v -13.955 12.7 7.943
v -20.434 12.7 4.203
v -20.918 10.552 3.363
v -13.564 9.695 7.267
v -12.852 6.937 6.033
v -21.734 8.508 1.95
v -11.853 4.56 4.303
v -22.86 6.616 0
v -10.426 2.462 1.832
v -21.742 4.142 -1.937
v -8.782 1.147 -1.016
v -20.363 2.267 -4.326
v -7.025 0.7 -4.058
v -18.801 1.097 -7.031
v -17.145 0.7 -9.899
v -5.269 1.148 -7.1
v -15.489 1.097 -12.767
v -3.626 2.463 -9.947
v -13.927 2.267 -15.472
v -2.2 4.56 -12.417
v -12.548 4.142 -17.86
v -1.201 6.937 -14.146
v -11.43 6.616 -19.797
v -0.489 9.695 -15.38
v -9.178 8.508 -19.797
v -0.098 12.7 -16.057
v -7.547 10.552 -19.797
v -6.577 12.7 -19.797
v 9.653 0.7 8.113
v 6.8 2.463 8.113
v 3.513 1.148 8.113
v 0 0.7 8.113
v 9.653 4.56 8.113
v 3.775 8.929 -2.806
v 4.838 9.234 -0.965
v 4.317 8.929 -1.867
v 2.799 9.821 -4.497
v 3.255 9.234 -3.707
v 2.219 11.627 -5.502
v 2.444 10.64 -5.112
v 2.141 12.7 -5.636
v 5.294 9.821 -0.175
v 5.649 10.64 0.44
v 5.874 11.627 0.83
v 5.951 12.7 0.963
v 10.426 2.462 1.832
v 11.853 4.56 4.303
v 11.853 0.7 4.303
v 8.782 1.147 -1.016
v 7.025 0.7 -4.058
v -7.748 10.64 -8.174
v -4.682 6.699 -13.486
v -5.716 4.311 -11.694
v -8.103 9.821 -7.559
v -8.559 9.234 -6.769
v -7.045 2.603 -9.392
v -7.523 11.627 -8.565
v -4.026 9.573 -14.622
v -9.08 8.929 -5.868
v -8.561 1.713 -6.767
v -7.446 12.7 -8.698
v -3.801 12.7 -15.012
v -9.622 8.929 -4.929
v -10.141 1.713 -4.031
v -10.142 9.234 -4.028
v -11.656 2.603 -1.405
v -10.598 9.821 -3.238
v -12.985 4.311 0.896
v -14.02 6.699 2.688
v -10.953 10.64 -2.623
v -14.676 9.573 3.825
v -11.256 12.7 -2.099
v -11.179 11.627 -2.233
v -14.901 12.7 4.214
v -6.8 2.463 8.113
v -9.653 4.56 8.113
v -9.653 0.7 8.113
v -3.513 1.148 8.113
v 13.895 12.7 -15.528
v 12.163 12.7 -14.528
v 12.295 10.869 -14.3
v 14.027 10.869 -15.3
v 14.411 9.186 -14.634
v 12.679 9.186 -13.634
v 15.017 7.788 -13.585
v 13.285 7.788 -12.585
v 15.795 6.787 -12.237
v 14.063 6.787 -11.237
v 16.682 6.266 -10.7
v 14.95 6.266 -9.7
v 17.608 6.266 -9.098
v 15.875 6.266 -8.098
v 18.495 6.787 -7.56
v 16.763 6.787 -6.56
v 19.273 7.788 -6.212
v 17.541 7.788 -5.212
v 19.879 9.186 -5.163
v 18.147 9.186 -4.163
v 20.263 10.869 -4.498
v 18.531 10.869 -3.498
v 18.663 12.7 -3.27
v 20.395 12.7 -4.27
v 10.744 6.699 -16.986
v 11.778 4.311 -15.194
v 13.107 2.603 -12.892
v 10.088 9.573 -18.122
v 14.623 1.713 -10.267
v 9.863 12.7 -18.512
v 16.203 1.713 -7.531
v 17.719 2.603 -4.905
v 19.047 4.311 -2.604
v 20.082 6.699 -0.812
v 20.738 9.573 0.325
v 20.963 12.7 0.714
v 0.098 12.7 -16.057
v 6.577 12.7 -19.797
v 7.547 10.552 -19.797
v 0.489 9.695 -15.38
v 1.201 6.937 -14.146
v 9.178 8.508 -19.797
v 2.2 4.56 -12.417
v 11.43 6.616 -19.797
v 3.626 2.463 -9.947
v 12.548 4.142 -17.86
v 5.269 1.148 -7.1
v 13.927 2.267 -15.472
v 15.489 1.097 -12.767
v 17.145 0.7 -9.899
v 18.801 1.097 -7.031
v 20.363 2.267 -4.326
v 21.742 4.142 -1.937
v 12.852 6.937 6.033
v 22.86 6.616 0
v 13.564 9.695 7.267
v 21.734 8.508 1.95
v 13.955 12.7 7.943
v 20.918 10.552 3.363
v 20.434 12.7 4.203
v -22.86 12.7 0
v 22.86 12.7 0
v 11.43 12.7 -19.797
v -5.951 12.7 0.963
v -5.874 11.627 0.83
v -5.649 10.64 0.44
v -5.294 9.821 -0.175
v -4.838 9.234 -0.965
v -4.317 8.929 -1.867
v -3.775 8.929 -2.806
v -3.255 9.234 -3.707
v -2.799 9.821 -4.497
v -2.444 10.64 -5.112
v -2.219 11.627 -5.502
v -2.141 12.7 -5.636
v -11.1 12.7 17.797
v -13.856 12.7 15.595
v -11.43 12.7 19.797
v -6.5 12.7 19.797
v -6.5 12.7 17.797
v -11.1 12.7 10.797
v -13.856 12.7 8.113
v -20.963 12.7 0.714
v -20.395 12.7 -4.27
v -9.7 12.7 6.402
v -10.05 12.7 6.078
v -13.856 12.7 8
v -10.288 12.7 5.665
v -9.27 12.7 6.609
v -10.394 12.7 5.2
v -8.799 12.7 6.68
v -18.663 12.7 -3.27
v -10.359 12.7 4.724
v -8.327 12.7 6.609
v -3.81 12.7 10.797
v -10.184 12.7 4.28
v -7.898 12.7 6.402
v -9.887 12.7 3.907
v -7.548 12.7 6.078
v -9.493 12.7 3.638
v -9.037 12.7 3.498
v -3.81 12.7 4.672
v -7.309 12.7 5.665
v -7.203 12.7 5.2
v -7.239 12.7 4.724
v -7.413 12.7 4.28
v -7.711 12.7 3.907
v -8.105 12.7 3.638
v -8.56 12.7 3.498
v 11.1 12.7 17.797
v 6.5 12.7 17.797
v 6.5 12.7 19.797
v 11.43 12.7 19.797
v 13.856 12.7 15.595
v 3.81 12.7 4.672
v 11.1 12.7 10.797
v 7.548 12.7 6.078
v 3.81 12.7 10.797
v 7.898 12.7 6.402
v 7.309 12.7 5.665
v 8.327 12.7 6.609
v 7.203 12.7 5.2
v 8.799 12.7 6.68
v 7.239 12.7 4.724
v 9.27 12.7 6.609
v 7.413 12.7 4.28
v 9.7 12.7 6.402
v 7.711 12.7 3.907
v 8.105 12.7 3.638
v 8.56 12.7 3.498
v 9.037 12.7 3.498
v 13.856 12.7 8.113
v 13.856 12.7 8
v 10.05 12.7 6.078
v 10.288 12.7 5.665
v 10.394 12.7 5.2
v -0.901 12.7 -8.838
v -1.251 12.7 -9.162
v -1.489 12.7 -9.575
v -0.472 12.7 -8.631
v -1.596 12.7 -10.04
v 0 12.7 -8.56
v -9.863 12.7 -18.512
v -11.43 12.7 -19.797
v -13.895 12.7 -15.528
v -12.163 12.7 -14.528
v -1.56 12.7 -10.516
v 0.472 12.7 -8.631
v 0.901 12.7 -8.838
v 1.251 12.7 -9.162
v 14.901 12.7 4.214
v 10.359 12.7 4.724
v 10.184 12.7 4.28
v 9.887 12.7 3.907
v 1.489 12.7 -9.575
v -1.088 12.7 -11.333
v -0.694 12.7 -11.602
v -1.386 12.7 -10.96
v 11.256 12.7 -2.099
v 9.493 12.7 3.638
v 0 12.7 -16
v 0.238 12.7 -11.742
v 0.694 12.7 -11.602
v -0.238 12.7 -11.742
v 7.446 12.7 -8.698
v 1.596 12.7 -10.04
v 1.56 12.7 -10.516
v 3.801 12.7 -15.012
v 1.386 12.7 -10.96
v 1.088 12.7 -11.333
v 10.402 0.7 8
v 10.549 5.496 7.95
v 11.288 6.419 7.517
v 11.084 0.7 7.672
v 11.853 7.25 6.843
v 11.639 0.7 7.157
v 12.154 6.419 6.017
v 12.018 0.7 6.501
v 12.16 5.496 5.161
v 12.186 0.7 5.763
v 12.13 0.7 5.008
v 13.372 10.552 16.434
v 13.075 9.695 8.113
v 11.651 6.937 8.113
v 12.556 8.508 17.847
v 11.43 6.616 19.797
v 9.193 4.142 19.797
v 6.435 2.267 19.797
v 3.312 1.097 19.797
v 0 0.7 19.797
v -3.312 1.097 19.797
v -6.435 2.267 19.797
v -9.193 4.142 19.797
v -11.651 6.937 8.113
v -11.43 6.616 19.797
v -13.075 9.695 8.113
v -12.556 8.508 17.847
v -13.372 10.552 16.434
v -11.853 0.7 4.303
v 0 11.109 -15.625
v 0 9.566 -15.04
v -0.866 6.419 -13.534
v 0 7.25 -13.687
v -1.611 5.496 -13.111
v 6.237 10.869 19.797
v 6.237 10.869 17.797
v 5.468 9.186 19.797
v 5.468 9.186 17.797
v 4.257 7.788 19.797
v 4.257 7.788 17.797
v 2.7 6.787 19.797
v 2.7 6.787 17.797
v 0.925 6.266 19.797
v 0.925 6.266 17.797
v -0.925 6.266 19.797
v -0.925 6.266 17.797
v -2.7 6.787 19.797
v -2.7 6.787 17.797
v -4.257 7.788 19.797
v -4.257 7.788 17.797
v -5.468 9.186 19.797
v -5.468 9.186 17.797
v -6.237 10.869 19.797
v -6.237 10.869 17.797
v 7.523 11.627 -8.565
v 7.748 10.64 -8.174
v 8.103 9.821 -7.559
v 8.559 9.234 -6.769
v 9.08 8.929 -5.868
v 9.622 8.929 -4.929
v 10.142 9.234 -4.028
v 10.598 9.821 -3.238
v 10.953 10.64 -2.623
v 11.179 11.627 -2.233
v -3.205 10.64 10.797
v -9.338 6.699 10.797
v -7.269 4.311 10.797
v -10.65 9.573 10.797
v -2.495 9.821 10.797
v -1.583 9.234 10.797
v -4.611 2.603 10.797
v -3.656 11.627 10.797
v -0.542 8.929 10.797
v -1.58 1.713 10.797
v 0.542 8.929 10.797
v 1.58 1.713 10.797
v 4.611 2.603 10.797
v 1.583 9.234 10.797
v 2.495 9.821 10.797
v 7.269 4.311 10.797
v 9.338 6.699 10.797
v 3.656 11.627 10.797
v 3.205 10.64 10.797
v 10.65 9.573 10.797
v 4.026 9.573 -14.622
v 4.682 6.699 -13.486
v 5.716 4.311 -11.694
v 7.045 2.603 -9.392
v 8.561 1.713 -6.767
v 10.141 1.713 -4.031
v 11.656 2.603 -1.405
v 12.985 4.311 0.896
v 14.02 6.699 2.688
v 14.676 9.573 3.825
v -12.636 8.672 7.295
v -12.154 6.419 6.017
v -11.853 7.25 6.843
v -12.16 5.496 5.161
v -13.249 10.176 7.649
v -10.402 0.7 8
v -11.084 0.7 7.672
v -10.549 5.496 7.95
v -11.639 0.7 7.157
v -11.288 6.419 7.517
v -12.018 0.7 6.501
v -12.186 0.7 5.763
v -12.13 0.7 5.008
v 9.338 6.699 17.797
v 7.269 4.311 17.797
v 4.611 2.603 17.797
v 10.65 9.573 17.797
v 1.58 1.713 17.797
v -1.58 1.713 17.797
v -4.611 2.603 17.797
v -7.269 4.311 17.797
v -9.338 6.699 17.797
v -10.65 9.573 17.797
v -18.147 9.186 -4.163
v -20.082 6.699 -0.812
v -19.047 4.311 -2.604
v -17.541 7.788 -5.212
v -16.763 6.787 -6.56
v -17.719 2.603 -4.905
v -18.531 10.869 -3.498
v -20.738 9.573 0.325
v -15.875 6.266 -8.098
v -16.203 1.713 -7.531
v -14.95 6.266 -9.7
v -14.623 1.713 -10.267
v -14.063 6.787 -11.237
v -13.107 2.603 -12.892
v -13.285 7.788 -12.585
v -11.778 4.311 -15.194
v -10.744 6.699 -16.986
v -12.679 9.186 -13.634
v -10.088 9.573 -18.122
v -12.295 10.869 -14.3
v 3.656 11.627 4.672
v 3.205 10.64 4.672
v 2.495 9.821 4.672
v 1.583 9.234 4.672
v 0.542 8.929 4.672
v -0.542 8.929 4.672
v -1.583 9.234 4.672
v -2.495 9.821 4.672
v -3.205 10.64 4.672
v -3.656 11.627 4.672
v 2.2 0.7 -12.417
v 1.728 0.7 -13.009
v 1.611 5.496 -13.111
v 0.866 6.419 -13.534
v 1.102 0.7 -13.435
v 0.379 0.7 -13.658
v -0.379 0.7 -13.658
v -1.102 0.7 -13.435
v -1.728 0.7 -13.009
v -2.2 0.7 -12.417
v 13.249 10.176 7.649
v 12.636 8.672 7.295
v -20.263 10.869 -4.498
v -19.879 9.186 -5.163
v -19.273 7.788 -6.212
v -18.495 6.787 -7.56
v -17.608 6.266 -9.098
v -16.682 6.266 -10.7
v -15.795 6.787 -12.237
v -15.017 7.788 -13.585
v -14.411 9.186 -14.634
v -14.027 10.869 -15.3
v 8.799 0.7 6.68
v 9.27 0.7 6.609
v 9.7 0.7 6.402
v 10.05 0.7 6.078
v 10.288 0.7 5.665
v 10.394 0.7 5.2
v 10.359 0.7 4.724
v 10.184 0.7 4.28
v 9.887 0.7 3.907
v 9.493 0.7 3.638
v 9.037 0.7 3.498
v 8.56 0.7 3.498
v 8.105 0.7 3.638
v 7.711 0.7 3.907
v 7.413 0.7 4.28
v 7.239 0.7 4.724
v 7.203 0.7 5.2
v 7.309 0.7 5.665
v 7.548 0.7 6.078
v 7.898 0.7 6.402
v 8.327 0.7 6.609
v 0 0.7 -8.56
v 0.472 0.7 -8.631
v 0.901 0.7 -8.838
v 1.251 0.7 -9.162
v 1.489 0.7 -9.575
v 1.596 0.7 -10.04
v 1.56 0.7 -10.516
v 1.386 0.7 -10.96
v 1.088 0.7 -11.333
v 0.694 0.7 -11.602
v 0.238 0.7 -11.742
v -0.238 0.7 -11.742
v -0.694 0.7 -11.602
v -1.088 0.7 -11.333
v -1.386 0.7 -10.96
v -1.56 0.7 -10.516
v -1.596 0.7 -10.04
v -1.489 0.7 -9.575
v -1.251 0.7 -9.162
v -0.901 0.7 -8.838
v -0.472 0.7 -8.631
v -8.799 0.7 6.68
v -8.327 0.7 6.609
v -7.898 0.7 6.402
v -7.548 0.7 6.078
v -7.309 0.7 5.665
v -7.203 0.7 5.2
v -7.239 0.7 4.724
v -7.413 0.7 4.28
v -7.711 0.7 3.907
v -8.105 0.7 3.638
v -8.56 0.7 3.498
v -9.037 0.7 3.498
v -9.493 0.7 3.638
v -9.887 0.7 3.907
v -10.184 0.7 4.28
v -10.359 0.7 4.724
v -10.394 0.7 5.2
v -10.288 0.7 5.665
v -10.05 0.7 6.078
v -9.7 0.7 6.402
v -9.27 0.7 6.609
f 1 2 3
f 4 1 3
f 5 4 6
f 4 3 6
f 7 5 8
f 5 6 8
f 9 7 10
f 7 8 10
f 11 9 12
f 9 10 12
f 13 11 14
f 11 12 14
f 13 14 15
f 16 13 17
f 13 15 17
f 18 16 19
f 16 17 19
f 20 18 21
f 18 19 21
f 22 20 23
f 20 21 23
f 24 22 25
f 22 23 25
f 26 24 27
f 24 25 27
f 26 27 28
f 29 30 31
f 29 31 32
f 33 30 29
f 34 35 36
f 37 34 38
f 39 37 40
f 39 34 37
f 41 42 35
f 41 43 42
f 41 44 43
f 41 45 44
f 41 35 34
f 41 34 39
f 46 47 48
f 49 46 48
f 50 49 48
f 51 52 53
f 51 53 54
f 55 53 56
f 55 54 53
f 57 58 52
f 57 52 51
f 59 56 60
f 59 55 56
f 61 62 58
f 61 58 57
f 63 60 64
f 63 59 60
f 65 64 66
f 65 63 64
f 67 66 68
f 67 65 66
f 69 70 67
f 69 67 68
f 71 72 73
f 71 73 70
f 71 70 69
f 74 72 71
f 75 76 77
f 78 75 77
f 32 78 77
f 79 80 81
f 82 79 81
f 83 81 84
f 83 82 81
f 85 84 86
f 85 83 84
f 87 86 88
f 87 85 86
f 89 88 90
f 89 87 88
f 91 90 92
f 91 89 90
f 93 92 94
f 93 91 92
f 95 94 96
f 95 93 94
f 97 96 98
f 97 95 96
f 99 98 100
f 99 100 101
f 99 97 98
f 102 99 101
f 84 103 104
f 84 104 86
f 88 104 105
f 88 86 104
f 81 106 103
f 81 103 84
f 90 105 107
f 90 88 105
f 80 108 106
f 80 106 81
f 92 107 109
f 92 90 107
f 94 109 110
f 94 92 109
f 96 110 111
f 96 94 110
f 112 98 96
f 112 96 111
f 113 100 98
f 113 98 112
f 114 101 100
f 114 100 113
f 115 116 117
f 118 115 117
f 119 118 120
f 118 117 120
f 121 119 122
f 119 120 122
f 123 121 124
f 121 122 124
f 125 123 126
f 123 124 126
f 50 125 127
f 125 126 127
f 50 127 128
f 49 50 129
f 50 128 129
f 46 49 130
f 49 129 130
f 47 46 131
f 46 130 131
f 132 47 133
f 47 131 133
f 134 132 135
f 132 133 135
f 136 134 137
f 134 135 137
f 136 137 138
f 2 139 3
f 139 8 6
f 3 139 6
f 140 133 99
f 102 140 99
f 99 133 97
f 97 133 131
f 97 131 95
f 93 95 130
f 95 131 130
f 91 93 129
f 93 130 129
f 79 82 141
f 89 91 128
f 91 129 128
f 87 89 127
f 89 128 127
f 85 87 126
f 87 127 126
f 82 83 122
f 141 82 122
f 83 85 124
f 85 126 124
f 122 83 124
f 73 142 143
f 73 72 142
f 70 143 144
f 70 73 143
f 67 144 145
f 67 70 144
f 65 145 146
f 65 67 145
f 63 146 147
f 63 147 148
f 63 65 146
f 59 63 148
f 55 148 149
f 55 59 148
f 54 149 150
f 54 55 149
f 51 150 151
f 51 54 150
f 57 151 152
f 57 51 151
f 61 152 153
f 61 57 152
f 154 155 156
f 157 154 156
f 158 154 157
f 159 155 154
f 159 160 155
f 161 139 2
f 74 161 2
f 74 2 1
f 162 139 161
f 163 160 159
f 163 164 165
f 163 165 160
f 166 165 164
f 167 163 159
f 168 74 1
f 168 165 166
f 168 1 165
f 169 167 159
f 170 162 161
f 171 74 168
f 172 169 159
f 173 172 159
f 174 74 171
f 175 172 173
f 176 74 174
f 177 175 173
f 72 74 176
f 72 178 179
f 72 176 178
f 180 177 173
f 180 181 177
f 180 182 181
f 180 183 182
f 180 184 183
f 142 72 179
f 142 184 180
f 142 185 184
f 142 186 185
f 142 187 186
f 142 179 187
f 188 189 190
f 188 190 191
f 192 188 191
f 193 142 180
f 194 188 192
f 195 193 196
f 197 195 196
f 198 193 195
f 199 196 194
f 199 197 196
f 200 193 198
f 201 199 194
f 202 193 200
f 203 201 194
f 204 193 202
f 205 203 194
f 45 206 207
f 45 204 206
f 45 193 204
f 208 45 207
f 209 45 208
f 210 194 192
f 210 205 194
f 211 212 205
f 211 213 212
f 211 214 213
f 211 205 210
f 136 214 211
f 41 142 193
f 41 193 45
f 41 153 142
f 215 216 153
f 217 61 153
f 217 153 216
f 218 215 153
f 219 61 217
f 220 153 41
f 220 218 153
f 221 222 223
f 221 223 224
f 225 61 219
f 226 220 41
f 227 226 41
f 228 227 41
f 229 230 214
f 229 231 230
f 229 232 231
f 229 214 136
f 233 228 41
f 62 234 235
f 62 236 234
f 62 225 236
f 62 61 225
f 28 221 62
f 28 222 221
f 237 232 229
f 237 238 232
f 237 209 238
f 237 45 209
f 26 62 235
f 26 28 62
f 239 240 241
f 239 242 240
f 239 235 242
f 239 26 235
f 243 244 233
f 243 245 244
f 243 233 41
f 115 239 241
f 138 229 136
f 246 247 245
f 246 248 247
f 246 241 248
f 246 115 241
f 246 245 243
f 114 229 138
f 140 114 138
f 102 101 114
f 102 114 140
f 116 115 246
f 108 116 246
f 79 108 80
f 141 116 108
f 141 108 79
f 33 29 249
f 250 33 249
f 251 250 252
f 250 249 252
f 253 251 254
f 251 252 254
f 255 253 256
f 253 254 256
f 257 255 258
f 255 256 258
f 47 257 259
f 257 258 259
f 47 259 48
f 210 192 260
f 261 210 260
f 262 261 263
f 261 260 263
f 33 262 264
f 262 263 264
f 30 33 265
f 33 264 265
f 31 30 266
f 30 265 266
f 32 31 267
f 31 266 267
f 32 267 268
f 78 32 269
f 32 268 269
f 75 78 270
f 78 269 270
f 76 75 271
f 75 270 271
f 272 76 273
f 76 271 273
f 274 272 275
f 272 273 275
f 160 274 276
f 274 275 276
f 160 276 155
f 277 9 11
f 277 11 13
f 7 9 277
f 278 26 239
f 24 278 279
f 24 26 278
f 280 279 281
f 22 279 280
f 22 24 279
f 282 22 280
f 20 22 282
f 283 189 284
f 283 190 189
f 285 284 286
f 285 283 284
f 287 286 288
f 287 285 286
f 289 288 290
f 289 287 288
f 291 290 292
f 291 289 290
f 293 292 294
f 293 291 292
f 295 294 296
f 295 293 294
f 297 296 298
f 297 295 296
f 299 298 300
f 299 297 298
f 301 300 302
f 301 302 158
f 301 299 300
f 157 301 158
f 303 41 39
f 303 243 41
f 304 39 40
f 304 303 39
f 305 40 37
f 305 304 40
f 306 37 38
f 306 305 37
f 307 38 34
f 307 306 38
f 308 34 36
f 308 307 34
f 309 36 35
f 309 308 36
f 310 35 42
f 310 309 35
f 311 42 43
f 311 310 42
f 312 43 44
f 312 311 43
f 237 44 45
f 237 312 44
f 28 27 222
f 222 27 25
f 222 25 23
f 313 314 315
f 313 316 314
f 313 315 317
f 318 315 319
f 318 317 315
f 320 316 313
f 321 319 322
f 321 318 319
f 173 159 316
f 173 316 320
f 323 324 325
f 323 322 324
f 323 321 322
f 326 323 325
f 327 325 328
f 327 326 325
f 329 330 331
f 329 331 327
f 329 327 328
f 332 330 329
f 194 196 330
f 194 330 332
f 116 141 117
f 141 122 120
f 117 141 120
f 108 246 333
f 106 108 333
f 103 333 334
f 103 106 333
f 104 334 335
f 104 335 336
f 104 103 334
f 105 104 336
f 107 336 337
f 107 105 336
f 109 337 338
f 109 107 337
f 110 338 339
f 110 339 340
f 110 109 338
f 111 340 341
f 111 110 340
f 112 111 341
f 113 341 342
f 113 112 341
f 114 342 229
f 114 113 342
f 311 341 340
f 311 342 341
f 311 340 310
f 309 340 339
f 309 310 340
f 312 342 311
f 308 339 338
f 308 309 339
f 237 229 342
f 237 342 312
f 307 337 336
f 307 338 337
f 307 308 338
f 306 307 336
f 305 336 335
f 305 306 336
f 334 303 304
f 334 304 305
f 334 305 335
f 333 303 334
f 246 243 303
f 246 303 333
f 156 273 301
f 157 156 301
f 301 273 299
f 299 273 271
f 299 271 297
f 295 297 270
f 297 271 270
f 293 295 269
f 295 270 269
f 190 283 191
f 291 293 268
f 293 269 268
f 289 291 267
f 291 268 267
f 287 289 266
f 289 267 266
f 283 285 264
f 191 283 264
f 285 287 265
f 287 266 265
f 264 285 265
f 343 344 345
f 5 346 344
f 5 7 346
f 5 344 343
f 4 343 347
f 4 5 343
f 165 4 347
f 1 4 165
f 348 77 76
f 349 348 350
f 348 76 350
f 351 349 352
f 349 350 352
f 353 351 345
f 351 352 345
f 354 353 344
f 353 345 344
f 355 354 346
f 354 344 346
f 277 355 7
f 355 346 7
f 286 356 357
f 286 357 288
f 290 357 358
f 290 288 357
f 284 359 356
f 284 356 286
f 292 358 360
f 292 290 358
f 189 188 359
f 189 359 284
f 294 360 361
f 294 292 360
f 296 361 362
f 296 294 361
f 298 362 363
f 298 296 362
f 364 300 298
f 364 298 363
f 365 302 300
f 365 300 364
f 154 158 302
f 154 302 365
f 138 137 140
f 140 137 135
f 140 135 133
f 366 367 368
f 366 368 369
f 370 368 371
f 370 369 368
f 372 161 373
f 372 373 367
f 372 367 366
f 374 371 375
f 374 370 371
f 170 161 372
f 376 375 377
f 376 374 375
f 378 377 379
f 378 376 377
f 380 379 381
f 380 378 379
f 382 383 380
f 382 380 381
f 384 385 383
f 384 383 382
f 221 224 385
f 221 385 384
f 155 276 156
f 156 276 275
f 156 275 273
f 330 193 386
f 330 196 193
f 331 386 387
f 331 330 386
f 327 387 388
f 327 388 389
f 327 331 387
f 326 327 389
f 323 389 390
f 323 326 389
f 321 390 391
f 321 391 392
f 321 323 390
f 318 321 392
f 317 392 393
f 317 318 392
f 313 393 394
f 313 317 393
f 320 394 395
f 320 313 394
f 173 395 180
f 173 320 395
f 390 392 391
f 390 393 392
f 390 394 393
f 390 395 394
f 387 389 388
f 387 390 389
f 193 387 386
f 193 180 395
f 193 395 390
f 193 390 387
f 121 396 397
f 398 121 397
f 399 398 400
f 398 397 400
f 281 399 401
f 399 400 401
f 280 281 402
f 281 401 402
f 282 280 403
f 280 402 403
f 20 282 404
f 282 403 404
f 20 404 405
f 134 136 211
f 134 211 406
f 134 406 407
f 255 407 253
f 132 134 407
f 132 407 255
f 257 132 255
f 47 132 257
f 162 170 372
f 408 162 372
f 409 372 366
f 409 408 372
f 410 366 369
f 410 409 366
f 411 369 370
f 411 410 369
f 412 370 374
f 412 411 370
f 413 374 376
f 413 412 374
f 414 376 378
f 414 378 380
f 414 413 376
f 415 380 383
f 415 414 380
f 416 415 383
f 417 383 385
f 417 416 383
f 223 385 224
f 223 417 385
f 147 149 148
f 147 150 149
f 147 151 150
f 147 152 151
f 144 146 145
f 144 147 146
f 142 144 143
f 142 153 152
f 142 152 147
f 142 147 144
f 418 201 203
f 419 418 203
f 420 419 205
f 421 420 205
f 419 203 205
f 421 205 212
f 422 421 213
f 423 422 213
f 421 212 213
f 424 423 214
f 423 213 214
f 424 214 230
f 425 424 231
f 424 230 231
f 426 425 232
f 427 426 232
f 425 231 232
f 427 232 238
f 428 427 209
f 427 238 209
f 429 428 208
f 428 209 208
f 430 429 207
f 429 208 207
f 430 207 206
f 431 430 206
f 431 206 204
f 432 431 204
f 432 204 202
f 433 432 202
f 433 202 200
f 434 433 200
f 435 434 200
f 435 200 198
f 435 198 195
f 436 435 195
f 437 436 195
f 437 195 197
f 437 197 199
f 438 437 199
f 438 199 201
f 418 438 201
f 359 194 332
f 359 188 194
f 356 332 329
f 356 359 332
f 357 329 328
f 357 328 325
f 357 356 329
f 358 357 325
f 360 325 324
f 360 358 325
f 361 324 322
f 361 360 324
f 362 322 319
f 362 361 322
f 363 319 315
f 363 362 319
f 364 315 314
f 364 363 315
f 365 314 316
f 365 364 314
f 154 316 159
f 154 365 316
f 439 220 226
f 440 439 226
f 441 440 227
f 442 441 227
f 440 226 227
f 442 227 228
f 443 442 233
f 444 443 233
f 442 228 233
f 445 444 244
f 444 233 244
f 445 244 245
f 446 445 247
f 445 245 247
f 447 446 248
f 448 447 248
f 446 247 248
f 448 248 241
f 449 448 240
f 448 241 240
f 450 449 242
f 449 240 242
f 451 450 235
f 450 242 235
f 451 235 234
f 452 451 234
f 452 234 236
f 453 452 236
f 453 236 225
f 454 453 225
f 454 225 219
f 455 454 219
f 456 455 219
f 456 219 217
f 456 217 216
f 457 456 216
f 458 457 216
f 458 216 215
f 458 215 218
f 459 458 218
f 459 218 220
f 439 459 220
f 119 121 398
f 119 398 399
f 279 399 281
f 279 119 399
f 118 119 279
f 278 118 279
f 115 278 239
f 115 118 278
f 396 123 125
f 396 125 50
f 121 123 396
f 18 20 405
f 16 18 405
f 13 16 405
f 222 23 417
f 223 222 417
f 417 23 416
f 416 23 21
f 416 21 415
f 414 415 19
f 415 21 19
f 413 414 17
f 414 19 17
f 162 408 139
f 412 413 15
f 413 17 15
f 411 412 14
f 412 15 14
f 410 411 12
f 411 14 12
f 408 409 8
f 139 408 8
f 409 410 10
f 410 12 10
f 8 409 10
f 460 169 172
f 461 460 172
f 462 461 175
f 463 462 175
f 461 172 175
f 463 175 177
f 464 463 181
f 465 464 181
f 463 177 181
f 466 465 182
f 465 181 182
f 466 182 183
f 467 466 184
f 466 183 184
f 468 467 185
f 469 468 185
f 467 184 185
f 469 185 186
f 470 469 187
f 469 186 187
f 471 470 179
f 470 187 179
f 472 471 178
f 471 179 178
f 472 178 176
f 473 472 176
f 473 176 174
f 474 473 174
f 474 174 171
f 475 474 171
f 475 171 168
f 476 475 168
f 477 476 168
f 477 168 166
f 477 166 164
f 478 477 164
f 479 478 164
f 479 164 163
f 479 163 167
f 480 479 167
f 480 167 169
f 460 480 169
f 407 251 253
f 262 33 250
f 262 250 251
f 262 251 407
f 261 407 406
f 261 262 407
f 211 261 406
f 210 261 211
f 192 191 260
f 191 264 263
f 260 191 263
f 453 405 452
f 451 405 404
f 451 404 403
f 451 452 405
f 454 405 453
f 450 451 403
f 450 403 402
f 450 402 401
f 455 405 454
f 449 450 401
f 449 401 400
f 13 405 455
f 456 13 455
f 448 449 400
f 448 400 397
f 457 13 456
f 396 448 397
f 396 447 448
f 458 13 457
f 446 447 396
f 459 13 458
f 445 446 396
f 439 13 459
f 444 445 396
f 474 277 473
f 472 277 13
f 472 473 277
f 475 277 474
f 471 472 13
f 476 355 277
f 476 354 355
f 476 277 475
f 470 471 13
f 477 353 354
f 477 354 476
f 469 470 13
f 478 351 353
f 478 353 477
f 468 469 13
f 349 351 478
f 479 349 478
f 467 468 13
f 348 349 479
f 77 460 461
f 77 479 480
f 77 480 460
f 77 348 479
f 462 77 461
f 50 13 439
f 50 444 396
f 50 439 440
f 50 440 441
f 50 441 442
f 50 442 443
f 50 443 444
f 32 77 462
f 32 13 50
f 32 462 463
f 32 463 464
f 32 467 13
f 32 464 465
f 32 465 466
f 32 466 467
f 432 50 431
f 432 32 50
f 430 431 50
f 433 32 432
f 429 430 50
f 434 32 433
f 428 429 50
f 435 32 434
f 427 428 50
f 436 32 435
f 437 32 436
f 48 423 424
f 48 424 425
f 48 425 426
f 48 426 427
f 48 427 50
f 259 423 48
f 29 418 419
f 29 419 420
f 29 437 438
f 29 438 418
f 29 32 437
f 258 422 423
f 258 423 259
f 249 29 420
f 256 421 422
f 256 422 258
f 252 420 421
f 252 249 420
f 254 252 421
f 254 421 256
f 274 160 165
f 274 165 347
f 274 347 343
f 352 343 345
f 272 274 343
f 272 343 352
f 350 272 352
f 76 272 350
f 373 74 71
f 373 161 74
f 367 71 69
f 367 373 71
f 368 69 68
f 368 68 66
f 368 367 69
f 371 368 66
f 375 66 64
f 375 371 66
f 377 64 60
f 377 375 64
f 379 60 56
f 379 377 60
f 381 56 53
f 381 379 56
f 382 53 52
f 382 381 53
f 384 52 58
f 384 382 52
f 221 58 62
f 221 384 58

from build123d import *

# Parameters (mm, degrees)
BOSS_EXTRUDE1_DEPTH = 12.7
SKETCH7_R           = 1.6
CUT_EXTRUDE2_DEPTH  = 12.7
CIRPATTERN1_COUNT   = 3
CUT_EXTRUDE3_DEPTH  = 11.684
CIRPATTERN2_COUNT   = 3
CUT_EXTRUDE5_DEPTH  = 0.7
FILLET2_R           = 2.54


with BuildPart() as part:
    # Sketch1 → Boss-Extrude1 (new body)
    with BuildSketch(Plane(origin=(0, 0, 0), x_dir=(1, 0, 0), z_dir=(0, 1, 0))):
        Polygon((11.43, -19.797340731), (22.86, 0), (11.43, 19.797340731), (-11.43, 19.797340731), (-22.86, 0), (-11.43, -19.797340731), align=None)
    extrude(amount=BOSS_EXTRUDE1_DEPTH)

    # Sketch5 → Cut-Revolve1 (revolve, cut)
    with BuildSketch(Plane(origin=(0, 12.7, 0), x_dir=(1, 0, 0), z_dir=(0, 1, 0))):
        Polygon((0, -19.797340731), (0, -4.672340739), (-3.81, -4.672340739), (-3.81, -10.797340731), (-11.100000152, -10.797340731), (-11.100000152, -17.797340731), (-6.5, -17.797340731), (-6.5, -19.797340731), align=None)
    cut_revolve1 = revolve(axis=Axis((0, 12.7, 19.797340731), (0, 0, -1)), mode=Mode.SUBTRACT)

    # Sketch7 → Cut-Extrude2 (cut)
    with BuildSketch(Plane(origin=(0, 12.7, 0), x_dir=(1, 0, 0), z_dir=(0, 1, 0))):
        with Locations(Location((0, 10.16, 0), (0, 0, 270))):
            Circle(SKETCH7_R)
        with Locations(Location((8.798818102, -5.08, 0), (0, 0, 270))):
            Circle(SKETCH7_R)
        with Locations(Location((-8.798818102, -5.08, 0), (0, 0, 270))):
            Circle(SKETCH7_R)
    extrude(amount=-CUT_EXTRUDE2_DEPTH, mode=Mode.SUBTRACT)

    # CirPattern1: Cut-Revolve1 ×3 about axis
    cirpattern1_axis = Axis((0, 0, 0), (0, 1, 0))
    for i in range(1, CIRPATTERN1_COUNT):
        add(cut_revolve1.rotate(cirpattern1_axis, i * 360 / CIRPATTERN1_COUNT), mode=Mode.SUBTRACT)

    # Sketch8 → Cut-Extrude3 (cut)
    with BuildSketch(Plane.XY.offset(19.797340731)):
        with BuildLine():
            Line((-13.856406592, 12.7), (-18.662949192, 12.7))
            Line((-18.662949192, 12.7), (-18.662949192, 0))
            Line((-18.662949192, 0), (18.662949192, 0))
            Line((18.662949192, 0), (18.662949192, 12.7))
            Line((18.662949192, 12.7), (13.856406592, 12.7))
            ThreePointArc((13.856406592, 12.7), (0, 0.69999987), (-13.856406592, 12.7))
        make_face()
    cut_extrude3 = extrude(amount=-CUT_EXTRUDE3_DEPTH, mode=Mode.SUBTRACT)

    # CirPattern2: Cut-Extrude3 ×3 about axis
    cirpattern2_axis = Axis((0, 0, 0), (0, 1, 0))
    for i in range(1, CIRPATTERN2_COUNT):
        add(cut_extrude3.rotate(cirpattern2_axis, i * 360 / CIRPATTERN2_COUNT), mode=Mode.SUBTRACT)

    # Sketch10 → Cut-Extrude5 (cut)
    with BuildSketch(Plane.XZ):
        Polygon((14.052718364, 8.113340731), (-14.052718364, 8.113340731), (0, -16.226681461), align=None)
    extrude(amount=-CUT_EXTRUDE5_DEPTH, mode=Mode.SUBTRACT)

    # Fillet2
    # the kernel refuses this fillet: 2.54 mm, written as the material it takes off along each edge
    with BuildSketch(Plane(origin=(14.052718364, -10.298522628, 8.113340731), x_dir=(-0.4999999999999996, 0, -0.8660254037844387), z_dir=(0, 1, 0))) as fillet2_piece_1_section:
        with BuildLine():
            CenterArc((FILLET2_R * 1.73205080757, FILLET2_R), FILLET2_R, 150, 120)
            Line((FILLET2_R * 0.866025403784, FILLET2_R * 1.5), (0, 0))
            Line((0, 0), (FILLET2_R * 1.73205080757, 0))
        make_face()
    fillet2_piece_1 = extrude(amount=33.997045256, mode=Mode.PRIVATE)
    fillet2_piece_1 = fillet2_piece_1 - Plane(origin=(6.277314066, 14.7, -3.624208966), x_dir=(-0.49487165940112743, -0.14285714153061227, -0.8571428573086736), z_dir=(0.8660254037844388, 0, -0.49999999999999983)) * Cylinder(14.00000013, 86, mode=Mode.PRIVATE)
    fillet2_piece_1 = fillet2_piece_1 - Plane(origin=(0, 14.7, 7.248417919), x_dir=(0.9897433188022552, -0.14285714153061224, 0), z_dir=(0, 0, 1)) * Cylinder(14.00000013, 86, mode=Mode.PRIVATE)
    add(fillet2_piece_1, mode=Mode.SUBTRACT)
    with BuildSketch(Plane(origin=(0, -10.298522628, -16.226681461), x_dir=(-0.5000000000000003, 0, 0.8660254037844386), z_dir=(0, 1, 0))) as fillet2_piece_2_section:
        with BuildLine():
            CenterArc((FILLET2_R * 1.73205080757, FILLET2_R), FILLET2_R, 150, 120)
            Line((FILLET2_R * 0.866025403784, FILLET2_R * 1.5), (0, 0))
            Line((0, 0), (FILLET2_R * 1.73205080757, 0))
        make_face()
    fillet2_piece_2 = extrude(amount=33.997045256, mode=Mode.PRIVATE)
    fillet2_piece_2 = fillet2_piece_2 - Plane(origin=(6.277314055, 14.7, -3.62420896), x_dir=(-0.49487165940112743, -0.14285714153061227, -0.8571428573086736), z_dir=(0.8660254037844388, 0, -0.49999999999999983)) * Cylinder(14.00000013, 86, mode=Mode.PRIVATE)
    fillet2_piece_2 = fillet2_piece_2 - Plane(origin=(-6.277314066, 14.7, -3.624208966), x_dir=(-0.4948716594011281, -0.14285714153061227, 0.8571428573086732), z_dir=(-0.8660254037844384, 0, -0.5000000000000004)) * Cylinder(14.00000013, 86, mode=Mode.PRIVATE)
    add(fillet2_piece_2, mode=Mode.SUBTRACT)
    with BuildSketch(Plane(origin=(-14.052718364, 23.698522628, 8.113340731), x_dir=(1, 0, 0), z_dir=(0, -1, 0))) as fillet2_piece_3_section:
        with BuildLine():
            CenterArc((FILLET2_R * 1.73205080757, -FILLET2_R), FILLET2_R, 90, 120)
            Line((FILLET2_R * 0.866025403784, -FILLET2_R * 1.5), (0, 0))
            Line((0, 0), (FILLET2_R * 1.73205080757, 0))
        make_face()
    fillet2_piece_3 = extrude(amount=33.997045256, mode=Mode.PRIVATE)
    fillet2_piece_3 = fillet2_piece_3 - Plane(origin=(0, 14.7, 7.248417932), x_dir=(0.9897433188022552, -0.14285714153061224, 0), z_dir=(0, 0, 1)) * Cylinder(14.00000013, 86, mode=Mode.PRIVATE)
    fillet2_piece_3 = fillet2_piece_3 - Plane(origin=(-6.277314055, 14.7, -3.62420896), x_dir=(-0.4948716594011281, -0.14285714153061227, 0.8571428573086732), z_dir=(-0.8660254037844384, 0, -0.5000000000000004)) * Cylinder(14.00000013, 86, mode=Mode.PRIVATE)
    add(fillet2_piece_3, mode=Mode.SUBTRACT)


solid = part.part
